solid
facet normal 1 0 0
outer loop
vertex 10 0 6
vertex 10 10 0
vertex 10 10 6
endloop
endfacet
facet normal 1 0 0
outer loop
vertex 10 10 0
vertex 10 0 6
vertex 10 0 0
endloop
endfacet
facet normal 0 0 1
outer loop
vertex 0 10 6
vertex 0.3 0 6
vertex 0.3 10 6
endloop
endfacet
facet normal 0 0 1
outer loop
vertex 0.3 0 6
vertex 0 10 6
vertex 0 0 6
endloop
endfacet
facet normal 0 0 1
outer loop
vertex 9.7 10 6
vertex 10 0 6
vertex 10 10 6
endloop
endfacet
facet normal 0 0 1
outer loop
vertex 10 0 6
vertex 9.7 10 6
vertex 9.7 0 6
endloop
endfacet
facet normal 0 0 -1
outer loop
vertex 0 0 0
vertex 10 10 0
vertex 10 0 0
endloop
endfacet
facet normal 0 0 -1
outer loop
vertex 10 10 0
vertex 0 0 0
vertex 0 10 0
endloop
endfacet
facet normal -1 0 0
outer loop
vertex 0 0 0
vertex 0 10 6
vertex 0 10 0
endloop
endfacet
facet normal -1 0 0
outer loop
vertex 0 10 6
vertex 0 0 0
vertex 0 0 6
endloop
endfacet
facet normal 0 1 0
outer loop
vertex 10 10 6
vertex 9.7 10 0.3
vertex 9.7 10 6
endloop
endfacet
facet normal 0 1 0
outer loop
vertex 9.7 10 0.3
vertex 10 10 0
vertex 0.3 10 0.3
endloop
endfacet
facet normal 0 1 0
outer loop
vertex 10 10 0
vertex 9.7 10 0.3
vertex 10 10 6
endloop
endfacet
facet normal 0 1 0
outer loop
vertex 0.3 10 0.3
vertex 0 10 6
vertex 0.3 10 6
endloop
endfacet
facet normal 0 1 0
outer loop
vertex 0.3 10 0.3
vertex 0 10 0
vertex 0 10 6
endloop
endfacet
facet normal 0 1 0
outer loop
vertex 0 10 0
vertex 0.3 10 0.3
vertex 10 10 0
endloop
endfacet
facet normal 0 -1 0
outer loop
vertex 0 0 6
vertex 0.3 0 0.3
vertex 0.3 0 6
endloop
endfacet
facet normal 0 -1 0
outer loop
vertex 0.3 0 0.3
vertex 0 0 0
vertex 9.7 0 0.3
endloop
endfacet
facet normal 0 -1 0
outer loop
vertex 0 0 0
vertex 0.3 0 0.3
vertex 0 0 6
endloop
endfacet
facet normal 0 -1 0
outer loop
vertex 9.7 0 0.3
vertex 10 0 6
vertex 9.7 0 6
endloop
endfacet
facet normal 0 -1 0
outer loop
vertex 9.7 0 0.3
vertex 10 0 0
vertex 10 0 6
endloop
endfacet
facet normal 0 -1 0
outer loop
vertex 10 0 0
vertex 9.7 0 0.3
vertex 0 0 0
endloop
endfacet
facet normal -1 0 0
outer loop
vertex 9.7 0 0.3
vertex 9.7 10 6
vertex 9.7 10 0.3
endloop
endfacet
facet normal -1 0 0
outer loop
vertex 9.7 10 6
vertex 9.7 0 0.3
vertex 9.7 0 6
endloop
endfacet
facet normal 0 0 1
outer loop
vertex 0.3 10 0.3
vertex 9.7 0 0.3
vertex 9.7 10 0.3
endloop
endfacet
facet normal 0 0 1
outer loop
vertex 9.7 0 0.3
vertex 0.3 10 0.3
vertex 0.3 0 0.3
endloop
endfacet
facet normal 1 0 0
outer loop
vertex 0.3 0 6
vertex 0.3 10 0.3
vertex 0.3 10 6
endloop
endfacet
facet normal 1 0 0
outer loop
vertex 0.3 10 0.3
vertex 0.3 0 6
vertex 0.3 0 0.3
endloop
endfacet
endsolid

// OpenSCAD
wall=.3;

difference() {
    cube( [ 10, 10, 6 ]);
    translate( [ wall, -1, wall ] ) {
        cube( [ 10-2*wall, 12, 8 ] );
    }
}
